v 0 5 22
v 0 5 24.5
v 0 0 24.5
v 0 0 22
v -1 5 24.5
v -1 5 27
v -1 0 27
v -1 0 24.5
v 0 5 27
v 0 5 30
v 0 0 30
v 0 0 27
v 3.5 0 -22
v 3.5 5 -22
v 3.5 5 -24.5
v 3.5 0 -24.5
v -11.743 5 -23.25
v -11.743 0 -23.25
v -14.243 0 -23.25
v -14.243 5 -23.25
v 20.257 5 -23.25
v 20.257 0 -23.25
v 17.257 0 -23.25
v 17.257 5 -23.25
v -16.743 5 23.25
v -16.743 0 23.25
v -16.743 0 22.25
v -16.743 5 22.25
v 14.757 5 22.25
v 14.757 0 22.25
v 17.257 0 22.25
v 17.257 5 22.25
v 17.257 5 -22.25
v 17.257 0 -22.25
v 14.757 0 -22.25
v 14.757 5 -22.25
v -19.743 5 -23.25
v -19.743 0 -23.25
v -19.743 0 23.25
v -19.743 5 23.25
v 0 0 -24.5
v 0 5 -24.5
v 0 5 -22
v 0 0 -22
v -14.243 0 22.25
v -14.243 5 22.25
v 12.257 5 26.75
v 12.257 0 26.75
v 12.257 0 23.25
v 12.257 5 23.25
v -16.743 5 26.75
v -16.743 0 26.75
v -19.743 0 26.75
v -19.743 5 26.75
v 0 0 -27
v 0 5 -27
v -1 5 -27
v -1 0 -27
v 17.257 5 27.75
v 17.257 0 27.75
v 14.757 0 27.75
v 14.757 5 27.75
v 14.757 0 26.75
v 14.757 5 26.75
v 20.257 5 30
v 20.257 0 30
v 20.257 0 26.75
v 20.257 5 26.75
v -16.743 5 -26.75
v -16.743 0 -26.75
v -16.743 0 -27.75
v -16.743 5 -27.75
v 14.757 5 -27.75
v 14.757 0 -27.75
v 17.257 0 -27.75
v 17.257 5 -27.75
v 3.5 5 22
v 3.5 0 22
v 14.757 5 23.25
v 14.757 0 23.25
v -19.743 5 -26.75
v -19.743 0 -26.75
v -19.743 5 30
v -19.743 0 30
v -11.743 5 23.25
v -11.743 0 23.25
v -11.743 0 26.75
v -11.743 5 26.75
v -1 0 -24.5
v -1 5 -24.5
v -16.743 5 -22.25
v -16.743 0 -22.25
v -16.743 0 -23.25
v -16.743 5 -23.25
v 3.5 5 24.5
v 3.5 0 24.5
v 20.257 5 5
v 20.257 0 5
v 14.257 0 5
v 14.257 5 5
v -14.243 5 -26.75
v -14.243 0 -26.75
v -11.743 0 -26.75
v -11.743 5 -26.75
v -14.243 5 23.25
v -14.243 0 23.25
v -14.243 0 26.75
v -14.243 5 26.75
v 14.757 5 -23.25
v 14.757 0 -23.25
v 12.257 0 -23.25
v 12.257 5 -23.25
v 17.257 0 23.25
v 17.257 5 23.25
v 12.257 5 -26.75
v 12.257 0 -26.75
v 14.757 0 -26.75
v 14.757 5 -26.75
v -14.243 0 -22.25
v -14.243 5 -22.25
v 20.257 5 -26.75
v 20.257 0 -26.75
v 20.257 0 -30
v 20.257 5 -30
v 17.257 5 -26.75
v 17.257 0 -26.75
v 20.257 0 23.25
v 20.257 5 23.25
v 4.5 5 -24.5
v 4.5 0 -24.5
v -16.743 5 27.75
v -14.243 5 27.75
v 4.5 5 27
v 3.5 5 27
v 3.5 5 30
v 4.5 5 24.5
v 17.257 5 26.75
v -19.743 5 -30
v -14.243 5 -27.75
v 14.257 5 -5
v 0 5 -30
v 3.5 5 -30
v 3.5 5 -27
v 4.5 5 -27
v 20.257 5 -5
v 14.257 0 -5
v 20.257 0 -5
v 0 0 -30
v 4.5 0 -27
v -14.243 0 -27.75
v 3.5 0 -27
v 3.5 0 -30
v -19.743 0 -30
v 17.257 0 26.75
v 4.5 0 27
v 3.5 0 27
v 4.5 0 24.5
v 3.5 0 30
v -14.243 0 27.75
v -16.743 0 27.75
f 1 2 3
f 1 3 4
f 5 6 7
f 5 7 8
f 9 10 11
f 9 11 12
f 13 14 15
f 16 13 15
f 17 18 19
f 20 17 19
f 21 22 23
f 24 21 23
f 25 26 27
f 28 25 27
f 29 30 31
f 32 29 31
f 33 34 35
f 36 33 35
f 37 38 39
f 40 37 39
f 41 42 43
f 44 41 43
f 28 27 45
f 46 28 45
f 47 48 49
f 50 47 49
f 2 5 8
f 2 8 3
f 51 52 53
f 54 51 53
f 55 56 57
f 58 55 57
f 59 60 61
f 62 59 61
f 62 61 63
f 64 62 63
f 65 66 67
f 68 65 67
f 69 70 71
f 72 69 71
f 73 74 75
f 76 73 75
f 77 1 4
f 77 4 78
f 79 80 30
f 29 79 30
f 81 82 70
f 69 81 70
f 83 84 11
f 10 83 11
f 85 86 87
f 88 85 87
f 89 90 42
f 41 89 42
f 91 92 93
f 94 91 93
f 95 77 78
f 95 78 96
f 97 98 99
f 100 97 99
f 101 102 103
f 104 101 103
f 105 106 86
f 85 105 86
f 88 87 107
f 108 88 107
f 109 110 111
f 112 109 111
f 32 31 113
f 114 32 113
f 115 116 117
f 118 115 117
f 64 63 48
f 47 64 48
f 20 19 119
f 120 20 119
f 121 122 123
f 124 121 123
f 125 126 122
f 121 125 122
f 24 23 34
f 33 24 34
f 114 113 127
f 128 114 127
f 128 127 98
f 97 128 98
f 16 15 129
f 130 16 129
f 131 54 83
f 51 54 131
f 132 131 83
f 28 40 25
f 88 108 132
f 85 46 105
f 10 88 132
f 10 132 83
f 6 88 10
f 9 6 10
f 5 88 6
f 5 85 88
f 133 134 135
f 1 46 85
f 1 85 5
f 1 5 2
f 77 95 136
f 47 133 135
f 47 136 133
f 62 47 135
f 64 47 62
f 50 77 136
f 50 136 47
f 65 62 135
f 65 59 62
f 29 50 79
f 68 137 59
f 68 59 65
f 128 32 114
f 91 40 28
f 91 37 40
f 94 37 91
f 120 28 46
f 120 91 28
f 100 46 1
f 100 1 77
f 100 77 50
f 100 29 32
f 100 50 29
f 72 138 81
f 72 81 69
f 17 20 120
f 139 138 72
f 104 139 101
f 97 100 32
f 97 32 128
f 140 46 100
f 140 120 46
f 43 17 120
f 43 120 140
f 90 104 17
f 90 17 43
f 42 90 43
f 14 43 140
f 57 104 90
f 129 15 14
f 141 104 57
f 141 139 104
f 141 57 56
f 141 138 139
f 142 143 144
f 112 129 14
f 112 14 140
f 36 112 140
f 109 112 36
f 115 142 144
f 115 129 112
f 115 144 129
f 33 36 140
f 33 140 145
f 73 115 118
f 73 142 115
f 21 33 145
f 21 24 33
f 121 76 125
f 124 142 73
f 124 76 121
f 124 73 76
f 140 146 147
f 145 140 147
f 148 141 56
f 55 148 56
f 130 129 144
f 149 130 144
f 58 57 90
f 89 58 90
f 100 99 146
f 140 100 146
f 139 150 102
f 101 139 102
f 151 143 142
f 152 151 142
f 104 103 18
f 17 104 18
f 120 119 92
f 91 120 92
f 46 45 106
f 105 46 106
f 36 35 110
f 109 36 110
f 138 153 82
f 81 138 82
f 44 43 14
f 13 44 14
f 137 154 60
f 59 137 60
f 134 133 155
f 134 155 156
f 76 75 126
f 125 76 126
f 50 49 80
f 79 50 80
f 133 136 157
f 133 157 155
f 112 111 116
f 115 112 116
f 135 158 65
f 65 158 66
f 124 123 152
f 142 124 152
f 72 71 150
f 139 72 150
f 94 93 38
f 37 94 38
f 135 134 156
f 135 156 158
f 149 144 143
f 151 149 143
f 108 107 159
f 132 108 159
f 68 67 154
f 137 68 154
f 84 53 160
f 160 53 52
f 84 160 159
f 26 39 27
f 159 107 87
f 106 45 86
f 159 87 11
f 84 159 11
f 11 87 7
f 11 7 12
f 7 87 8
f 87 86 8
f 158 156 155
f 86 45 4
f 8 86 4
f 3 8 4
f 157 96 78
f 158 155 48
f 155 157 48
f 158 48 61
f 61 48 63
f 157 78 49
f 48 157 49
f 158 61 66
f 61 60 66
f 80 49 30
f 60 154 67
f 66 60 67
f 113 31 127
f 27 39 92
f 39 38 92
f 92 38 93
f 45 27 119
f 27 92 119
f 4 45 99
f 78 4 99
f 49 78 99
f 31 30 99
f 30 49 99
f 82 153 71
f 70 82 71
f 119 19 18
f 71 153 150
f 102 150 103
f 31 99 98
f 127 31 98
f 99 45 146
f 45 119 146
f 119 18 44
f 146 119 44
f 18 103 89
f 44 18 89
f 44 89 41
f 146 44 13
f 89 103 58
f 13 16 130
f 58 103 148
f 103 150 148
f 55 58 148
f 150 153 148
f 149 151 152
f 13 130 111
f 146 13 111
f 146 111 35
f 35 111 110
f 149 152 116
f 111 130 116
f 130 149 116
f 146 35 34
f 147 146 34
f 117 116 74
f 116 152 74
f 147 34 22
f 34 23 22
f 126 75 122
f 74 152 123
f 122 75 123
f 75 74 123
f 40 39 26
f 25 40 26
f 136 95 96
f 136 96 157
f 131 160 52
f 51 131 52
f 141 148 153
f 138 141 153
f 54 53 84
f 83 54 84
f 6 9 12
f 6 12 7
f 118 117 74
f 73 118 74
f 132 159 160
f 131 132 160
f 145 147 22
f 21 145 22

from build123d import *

# Parameters (mm, degrees)
EXTRUDE_1_DEPTH     = 5
CUT_EXTRUDE_1_DEPTH = 5


with BuildPart() as part:
    # 草图1 → 凸台-拉伸1 (new body)
    with BuildSketch(Plane(origin=(0, 0, 0), x_dir=(1, 0, 0), z_dir=(0, 1, 0))):
        Polygon((-19.743275532, 30), (-19.743275532, 26.75), (-16.743275532, 26.75), (-16.743275532, 27.75), (-14.243275532, 27.75), (-14.243275532, 26.75), (-11.743275532, 26.75), (-11.743275532, 23.25), (-14.243275532, 23.25), (-14.243275532, 22.25), (-16.743275532, 22.25), (-16.743275532, 23.25), (-19.743275532, 23.25), (-19.743275532, -23.25), (-16.743275532, -23.25), (-16.743275532, -22.25), (-14.243275532, -22.25), (-14.243275532, -23.25), (-11.743275532, -23.25), (-11.743275532, -26.75), (-14.243275532, -26.75), (-14.243275532, -27.75), (-16.743275532, -27.75), (-16.743275532, -26.75), (-19.743275532, -26.75), (-19.743275532, -30), (20.256724468, -30), (20.256724468, -26.75), (17.256724468, -26.75), (17.256724468, -27.75), (14.756724468, -27.75), (14.756724468, -26.75), (12.256724468, -26.75), (12.256724468, -23.25), (14.756724468, -23.25), (14.756724468, -22.25), (17.256724468, -22.25), (17.256724468, -23.25), (20.256724468, -23.25), (20.256724468, -5), (14.256724468, -5), (14.256724468, 5), (20.256724468, 5), (20.256724468, 23.25), (17.256724468, 23.25), (17.256724468, 22.25), (14.756724468, 22.25), (14.756724468, 23.25), (12.256724468, 23.25), (12.256724468, 26.75), (14.756724468, 26.75), (14.756724468, 27.75), (17.256724468, 27.75), (17.256724468, 26.75), (20.256724468, 26.75), (20.256724468, 30), align=None)
    extrude(amount=EXTRUDE_1_DEPTH)

    # 草图2 → 切除-拉伸1 (cut)
    with BuildSketch(Plane(origin=(0, 5, 0), x_dir=(1, 0, 0), z_dir=(0, 1, 0))):
        Polygon((0, 30), (0, 27), (-1, 27), (-1, 24.5), (0, 24.5), (0, 22), (3.5, 22), (3.5, 24.5), (4.5, 24.5), (4.5, 27), (3.5, 27), (3.5, 30), align=None)
        Polygon((3.5, -30), (0, -30), (0, -27), (-1, -27), (-1, -24.5), (0, -24.5), (0, -22), (3.5, -22), (3.5, -24.5), (4.5, -24.5), (4.5, -27), (3.5, -27), align=None)
    extrude(amount=-CUT_EXTRUDE_1_DEPTH, mode=Mode.SUBTRACT)


solid = part.part
